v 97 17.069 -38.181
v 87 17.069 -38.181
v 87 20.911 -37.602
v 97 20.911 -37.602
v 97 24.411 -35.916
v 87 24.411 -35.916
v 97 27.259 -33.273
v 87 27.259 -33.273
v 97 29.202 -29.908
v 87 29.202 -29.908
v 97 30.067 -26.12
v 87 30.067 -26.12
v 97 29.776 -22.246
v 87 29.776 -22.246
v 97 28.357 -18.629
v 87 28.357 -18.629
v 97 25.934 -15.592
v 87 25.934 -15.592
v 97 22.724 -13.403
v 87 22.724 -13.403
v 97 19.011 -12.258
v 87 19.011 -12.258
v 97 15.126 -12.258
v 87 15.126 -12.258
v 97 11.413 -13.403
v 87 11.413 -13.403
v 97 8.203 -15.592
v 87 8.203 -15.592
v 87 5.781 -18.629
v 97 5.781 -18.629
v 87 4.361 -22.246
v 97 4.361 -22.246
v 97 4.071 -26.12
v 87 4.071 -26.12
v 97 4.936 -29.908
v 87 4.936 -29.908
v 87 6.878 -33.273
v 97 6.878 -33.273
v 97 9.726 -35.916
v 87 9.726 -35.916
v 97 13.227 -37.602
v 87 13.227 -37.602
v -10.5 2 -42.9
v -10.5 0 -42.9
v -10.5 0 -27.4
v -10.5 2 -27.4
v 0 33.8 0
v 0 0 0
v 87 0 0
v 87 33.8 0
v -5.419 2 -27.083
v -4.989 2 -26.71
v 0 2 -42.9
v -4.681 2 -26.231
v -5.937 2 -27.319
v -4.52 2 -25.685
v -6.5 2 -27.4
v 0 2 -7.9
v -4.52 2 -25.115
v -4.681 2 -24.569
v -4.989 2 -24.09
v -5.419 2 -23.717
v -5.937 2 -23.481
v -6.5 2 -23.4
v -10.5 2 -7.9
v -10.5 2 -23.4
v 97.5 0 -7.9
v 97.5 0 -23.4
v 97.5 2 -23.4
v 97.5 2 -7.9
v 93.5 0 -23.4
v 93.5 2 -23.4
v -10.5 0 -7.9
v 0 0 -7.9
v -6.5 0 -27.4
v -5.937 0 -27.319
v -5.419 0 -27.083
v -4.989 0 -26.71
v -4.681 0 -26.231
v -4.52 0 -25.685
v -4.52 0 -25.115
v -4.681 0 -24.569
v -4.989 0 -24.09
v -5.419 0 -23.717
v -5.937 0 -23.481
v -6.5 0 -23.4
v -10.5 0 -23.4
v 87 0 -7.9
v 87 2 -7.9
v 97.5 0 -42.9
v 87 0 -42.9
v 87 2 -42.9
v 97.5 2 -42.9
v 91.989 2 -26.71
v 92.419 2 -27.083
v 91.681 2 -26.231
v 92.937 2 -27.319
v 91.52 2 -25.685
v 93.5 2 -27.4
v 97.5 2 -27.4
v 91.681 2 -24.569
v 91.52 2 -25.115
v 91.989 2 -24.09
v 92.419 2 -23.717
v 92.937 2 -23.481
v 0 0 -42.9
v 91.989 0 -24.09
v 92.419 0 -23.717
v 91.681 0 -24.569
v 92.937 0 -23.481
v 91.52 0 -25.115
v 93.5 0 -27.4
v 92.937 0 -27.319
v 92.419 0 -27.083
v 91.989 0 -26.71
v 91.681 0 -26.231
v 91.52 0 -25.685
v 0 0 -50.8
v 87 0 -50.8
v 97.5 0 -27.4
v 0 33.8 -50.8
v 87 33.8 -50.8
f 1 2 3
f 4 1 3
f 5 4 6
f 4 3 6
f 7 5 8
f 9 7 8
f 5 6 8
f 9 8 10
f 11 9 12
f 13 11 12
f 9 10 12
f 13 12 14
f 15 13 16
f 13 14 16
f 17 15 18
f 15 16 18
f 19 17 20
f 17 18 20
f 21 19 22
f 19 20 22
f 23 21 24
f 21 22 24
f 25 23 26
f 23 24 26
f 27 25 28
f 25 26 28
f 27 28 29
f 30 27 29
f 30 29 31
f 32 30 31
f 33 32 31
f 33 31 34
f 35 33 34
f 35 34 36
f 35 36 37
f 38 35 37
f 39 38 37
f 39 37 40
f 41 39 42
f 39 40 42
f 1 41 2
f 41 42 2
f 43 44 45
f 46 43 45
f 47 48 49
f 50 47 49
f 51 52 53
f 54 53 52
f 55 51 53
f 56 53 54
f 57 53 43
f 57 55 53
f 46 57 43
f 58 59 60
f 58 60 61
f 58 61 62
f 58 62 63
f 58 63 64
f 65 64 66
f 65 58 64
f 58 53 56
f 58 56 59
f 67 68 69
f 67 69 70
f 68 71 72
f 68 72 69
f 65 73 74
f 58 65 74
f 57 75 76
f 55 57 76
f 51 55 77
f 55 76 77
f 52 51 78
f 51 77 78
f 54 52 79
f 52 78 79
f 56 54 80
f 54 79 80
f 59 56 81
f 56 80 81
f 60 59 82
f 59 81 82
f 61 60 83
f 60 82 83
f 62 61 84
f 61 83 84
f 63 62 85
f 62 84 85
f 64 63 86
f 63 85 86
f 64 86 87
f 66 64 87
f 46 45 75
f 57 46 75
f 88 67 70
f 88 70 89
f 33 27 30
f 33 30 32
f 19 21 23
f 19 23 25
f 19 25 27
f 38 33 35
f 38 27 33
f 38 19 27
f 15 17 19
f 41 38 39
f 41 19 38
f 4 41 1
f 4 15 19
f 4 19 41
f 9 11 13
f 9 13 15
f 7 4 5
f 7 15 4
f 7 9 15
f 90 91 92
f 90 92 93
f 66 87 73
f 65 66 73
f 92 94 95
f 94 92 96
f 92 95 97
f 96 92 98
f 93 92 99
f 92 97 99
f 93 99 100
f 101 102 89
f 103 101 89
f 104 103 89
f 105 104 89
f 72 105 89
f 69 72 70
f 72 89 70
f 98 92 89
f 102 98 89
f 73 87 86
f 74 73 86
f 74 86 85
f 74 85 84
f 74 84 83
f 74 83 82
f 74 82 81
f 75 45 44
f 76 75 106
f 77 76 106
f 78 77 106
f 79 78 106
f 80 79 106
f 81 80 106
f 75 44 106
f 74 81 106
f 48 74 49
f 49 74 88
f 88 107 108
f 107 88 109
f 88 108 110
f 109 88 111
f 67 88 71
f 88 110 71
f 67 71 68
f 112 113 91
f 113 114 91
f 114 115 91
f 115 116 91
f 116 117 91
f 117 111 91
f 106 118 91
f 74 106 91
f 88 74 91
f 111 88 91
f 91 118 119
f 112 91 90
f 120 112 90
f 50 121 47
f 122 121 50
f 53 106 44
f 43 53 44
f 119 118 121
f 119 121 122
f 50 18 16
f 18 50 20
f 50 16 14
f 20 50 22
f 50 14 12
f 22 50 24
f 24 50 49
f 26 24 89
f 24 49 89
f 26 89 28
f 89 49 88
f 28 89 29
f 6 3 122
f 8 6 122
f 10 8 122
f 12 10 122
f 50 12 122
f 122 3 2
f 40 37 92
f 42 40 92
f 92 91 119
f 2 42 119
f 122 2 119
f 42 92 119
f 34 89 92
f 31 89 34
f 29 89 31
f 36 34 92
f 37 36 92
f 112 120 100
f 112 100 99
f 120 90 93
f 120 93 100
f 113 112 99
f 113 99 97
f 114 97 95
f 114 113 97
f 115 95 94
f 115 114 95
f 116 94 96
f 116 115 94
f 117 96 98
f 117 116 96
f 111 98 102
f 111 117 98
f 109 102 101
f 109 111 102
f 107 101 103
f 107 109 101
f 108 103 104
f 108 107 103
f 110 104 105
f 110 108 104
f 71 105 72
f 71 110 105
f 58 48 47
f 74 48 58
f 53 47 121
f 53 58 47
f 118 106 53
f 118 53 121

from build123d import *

# Parameters (mm, degrees)
SKETCH1_W           = 87
SKETCH1_H           = 50.8
BOSS_EXTRUDE1_DEPTH = 33.8
BOSS_EXTRUDE2_DEPTH = 2
SKETCH5_R           = 13.034233904
BOSS_EXTRUDE4_DEPTH = 10


with BuildPart() as part:
    # Sketch1 → Boss-Extrude1 (new body)
    with BuildSketch(Plane(origin=(0, 0, 0), x_dir=(1, 0, 0), z_dir=(0, 1, 0))):
        with Locations((43.5, 25.4)):
            Rectangle(SKETCH1_W, SKETCH1_H)
    extrude(amount=BOSS_EXTRUDE1_DEPTH)

    # Sketch2 → Boss-Extrude2 (add)
    with BuildSketch(Plane.XZ):
        with BuildLine():
            Line((0, -42.9), (-10.5, -42.9))
            Line((-10.5, -42.9), (-10.5, -27.4))
            Line((-10.5, -27.4), (-6.5, -27.4))
            ThreePointArc((-6.5, -27.4), (-4.5, -25.4), (-6.5, -23.4))
            Line((-6.5, -23.4), (-10.5, -23.4))
            Line((-10.5, -23.4), (-10.5, -7.9))
            Line((-10.5, -7.9), (0, -7.9))
            Line((0, -7.9), (0, -42.9))
        make_face()
        with BuildLine():
            Line((97.5, -23.4), (97.5, -7.9))
            Line((97.5, -7.9), (87, -7.9))
            Line((87, -7.9), (87, -42.9))
            Line((87, -42.9), (97.5, -42.9))
            Line((97.5, -42.9), (97.5, -27.4))
            Line((97.5, -27.4), (93.5, -27.4))
            ThreePointArc((93.5, -27.4), (91.5, -25.4), (93.5, -23.4))
            Line((93.5, -23.4), (97.5, -23.4))
        make_face()
    extrude(amount=-BOSS_EXTRUDE2_DEPTH)

    # Sketch5 → Boss-Extrude4 (add)
    with BuildSketch(Plane(origin=(87, 0, 0), x_dir=(0, 0, -1), z_dir=(1, 0, 0))):
        with Locations((25.146357233, 17.068762313)):
            Circle(SKETCH5_R)
    extrude(amount=BOSS_EXTRUDE4_DEPTH)


solid = part.part
